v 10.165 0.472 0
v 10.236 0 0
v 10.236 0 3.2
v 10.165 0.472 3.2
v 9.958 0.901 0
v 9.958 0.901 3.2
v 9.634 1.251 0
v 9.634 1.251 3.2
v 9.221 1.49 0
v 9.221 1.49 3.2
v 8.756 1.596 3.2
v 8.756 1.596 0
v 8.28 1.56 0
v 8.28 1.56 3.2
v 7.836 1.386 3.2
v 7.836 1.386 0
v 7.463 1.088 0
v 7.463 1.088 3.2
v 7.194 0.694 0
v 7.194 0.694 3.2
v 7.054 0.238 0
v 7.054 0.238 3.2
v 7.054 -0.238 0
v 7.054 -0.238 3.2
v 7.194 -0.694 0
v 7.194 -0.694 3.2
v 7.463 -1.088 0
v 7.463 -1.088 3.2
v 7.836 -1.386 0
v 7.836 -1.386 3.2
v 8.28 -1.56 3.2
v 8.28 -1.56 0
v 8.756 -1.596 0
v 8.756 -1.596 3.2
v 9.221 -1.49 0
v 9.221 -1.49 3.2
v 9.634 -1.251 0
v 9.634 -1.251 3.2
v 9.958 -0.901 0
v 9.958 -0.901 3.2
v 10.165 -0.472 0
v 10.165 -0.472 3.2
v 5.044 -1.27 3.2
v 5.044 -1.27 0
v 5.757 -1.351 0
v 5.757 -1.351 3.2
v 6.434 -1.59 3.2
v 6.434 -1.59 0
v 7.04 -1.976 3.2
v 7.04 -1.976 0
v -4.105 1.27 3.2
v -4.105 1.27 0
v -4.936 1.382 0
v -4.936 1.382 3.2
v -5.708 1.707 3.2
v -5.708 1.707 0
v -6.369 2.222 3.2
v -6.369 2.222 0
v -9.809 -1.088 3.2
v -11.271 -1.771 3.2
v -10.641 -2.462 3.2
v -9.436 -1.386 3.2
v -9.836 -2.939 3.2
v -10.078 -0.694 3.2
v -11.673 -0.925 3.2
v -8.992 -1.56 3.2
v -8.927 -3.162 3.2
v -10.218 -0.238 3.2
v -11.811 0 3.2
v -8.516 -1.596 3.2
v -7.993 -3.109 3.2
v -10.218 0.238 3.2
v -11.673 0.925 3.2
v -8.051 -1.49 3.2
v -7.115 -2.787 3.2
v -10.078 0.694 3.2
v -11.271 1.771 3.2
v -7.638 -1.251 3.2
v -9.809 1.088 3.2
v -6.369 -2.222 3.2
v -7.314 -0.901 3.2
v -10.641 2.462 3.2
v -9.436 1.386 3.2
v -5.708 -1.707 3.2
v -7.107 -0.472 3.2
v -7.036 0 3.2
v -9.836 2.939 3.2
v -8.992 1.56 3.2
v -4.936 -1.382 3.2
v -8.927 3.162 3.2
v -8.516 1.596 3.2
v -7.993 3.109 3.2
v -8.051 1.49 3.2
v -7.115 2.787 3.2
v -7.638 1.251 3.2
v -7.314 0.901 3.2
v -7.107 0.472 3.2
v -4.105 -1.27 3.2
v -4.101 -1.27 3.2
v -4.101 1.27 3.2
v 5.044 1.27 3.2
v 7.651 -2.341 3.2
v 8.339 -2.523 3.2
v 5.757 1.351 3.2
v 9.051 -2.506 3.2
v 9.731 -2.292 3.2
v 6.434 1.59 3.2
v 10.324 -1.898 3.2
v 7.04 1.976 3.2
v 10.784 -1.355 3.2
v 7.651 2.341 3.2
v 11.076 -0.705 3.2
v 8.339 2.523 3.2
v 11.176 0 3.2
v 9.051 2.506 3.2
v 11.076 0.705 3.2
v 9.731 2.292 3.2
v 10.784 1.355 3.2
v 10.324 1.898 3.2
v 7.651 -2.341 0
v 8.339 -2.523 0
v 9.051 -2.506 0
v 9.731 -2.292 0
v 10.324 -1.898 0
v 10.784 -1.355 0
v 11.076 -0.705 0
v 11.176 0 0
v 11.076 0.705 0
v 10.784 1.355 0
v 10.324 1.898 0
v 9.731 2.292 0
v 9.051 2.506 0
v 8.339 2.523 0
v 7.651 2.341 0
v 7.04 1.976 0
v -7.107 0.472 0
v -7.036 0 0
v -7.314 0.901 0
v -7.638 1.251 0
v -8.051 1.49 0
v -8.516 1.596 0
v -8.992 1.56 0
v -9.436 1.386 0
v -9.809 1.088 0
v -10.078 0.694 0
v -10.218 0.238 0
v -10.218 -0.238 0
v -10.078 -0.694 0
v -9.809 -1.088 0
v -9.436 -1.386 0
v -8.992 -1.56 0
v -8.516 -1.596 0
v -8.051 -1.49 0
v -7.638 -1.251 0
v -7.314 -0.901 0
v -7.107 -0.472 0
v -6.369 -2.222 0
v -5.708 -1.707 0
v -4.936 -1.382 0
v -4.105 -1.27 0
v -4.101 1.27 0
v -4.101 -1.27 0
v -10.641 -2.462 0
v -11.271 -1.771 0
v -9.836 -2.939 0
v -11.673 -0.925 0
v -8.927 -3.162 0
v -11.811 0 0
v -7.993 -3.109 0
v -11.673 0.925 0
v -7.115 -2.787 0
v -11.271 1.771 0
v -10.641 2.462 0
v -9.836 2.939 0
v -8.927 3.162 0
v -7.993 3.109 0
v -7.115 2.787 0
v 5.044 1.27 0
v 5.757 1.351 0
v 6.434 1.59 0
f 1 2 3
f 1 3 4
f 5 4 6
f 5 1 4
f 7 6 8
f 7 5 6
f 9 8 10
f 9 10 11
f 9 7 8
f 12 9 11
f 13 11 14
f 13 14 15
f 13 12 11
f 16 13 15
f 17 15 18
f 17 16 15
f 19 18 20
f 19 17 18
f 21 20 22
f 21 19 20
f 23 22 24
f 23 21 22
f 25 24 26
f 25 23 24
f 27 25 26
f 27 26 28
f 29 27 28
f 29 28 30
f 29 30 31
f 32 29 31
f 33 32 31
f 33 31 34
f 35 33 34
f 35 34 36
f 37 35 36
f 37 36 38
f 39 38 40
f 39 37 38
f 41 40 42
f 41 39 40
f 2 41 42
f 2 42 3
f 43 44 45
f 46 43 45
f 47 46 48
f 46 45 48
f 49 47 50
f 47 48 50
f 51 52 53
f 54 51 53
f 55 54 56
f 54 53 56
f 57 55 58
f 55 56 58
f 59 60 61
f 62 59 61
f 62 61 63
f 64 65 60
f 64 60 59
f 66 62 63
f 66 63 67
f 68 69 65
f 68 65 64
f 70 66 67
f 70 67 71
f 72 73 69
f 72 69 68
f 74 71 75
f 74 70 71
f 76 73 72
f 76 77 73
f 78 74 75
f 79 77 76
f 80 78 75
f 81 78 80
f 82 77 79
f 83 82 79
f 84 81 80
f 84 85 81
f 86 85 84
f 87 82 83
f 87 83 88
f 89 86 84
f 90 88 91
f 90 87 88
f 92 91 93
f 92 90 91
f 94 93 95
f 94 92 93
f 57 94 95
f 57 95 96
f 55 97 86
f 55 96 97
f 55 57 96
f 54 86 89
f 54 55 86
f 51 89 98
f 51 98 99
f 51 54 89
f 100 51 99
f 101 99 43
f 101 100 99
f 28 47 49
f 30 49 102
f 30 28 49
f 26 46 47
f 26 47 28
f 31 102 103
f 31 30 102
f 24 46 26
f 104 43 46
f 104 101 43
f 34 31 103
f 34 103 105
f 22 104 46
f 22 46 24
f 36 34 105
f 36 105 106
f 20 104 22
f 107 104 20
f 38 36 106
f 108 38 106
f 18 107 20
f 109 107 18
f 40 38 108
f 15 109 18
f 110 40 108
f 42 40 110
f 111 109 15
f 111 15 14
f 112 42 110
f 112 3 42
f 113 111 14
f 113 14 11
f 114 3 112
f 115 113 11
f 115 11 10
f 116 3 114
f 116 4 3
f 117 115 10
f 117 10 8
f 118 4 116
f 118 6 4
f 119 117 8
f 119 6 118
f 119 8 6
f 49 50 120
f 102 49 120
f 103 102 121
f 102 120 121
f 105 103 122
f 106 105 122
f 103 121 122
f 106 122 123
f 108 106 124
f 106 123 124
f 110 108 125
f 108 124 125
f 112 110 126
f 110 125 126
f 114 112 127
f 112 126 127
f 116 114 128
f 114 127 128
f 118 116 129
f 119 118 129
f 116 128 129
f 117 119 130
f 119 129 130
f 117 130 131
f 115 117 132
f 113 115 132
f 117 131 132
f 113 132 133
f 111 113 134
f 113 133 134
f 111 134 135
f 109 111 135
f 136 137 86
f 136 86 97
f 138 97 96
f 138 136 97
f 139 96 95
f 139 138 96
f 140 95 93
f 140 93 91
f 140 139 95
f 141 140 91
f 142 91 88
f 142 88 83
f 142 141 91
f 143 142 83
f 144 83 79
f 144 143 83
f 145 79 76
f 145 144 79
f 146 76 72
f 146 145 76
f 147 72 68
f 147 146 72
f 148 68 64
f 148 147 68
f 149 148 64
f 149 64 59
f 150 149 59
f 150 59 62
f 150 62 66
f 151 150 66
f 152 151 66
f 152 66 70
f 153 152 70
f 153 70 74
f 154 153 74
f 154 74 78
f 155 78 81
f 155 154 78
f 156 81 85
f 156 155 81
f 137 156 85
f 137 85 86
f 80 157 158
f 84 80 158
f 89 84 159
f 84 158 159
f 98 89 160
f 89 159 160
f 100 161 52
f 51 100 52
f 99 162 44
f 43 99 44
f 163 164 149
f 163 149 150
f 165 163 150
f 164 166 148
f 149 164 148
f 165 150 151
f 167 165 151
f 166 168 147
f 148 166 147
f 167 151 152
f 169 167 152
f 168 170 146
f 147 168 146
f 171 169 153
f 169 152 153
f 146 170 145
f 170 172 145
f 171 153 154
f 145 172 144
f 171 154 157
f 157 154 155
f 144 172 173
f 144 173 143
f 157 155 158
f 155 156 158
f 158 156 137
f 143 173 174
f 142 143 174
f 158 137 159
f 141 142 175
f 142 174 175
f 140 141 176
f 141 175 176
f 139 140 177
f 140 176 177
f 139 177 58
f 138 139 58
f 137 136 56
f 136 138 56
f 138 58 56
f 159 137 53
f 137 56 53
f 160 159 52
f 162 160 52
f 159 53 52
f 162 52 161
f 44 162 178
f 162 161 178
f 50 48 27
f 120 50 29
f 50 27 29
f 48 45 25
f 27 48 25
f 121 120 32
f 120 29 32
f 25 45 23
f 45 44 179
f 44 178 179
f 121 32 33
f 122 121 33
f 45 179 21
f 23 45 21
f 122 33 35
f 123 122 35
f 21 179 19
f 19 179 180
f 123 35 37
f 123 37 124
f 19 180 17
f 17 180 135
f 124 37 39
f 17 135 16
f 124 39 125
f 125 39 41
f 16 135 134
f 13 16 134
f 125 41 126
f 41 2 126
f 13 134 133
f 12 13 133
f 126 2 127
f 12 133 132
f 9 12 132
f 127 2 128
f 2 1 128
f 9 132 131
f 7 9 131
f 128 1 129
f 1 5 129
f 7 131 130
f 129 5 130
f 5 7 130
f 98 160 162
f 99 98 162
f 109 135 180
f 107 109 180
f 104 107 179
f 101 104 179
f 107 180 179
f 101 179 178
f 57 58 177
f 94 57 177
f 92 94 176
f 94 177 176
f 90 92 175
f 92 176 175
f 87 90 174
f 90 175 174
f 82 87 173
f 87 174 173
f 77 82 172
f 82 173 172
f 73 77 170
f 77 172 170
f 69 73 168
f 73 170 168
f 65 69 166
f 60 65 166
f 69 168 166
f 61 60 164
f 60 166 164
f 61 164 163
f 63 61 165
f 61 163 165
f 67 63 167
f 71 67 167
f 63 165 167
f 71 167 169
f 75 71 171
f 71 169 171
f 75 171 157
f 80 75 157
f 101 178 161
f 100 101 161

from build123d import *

# Parameters (mm, degrees)
F0_R     = 1.6002
F1_DEPTH = 3.2004


# Not quite as in the source:
# - ends of sketch curves that miss each other by under 0.0002 mm in the source are joined


with BuildPart() as f1:
    # F0 (on Top) → F1 (new body)
    with BuildSketch(Plane.XY):
        with BuildLine():
            ThreePointArc((-4.1050543049, 1.270002348), (-5.3326449309, 1.5185429247), (-6.3685964739, 2.2225))
            ThreePointArc((-6.3685964739, 2.2225), (-11.811, 0), (-6.3685964739, -2.2225))
            ThreePointArc((-6.3685964739, -2.2225), (-5.3326449309, -1.5185429247), (-4.1050543049, -1.270002348))
            Line((-4.1050543049, -1.270002348), (-4.1011929479, -1.27))
            Line((-4.1011929479, -1.27), (5.0438975516, -1.27))
            ThreePointArc((5.0438975516, -1.27), (6.1022308849, -1.451581293), (7.0395100229, -1.9755555556))
            ThreePointArc((7.0395100229, -1.9755555556), (11.176, 0), (7.0395100229, 1.9755555556))
            ThreePointArc((7.0395100229, 1.9755555556), (6.1022308849, 1.451581293), (5.0438975516, 1.27))
            Line((5.0438975516, 1.27), (-4.1011929479, 1.27))
            Line((-4.1011929479, 1.27), (-4.1050543049, 1.270002348))
        make_face()
        with Locations((-8.636, 0)):
            Circle(F0_R, mode=Mode.SUBTRACT)
        with Locations((8.636, 0)):
            Circle(F0_R, mode=Mode.SUBTRACT)
    extrude(amount=F1_DEPTH)


solid = f1.part
